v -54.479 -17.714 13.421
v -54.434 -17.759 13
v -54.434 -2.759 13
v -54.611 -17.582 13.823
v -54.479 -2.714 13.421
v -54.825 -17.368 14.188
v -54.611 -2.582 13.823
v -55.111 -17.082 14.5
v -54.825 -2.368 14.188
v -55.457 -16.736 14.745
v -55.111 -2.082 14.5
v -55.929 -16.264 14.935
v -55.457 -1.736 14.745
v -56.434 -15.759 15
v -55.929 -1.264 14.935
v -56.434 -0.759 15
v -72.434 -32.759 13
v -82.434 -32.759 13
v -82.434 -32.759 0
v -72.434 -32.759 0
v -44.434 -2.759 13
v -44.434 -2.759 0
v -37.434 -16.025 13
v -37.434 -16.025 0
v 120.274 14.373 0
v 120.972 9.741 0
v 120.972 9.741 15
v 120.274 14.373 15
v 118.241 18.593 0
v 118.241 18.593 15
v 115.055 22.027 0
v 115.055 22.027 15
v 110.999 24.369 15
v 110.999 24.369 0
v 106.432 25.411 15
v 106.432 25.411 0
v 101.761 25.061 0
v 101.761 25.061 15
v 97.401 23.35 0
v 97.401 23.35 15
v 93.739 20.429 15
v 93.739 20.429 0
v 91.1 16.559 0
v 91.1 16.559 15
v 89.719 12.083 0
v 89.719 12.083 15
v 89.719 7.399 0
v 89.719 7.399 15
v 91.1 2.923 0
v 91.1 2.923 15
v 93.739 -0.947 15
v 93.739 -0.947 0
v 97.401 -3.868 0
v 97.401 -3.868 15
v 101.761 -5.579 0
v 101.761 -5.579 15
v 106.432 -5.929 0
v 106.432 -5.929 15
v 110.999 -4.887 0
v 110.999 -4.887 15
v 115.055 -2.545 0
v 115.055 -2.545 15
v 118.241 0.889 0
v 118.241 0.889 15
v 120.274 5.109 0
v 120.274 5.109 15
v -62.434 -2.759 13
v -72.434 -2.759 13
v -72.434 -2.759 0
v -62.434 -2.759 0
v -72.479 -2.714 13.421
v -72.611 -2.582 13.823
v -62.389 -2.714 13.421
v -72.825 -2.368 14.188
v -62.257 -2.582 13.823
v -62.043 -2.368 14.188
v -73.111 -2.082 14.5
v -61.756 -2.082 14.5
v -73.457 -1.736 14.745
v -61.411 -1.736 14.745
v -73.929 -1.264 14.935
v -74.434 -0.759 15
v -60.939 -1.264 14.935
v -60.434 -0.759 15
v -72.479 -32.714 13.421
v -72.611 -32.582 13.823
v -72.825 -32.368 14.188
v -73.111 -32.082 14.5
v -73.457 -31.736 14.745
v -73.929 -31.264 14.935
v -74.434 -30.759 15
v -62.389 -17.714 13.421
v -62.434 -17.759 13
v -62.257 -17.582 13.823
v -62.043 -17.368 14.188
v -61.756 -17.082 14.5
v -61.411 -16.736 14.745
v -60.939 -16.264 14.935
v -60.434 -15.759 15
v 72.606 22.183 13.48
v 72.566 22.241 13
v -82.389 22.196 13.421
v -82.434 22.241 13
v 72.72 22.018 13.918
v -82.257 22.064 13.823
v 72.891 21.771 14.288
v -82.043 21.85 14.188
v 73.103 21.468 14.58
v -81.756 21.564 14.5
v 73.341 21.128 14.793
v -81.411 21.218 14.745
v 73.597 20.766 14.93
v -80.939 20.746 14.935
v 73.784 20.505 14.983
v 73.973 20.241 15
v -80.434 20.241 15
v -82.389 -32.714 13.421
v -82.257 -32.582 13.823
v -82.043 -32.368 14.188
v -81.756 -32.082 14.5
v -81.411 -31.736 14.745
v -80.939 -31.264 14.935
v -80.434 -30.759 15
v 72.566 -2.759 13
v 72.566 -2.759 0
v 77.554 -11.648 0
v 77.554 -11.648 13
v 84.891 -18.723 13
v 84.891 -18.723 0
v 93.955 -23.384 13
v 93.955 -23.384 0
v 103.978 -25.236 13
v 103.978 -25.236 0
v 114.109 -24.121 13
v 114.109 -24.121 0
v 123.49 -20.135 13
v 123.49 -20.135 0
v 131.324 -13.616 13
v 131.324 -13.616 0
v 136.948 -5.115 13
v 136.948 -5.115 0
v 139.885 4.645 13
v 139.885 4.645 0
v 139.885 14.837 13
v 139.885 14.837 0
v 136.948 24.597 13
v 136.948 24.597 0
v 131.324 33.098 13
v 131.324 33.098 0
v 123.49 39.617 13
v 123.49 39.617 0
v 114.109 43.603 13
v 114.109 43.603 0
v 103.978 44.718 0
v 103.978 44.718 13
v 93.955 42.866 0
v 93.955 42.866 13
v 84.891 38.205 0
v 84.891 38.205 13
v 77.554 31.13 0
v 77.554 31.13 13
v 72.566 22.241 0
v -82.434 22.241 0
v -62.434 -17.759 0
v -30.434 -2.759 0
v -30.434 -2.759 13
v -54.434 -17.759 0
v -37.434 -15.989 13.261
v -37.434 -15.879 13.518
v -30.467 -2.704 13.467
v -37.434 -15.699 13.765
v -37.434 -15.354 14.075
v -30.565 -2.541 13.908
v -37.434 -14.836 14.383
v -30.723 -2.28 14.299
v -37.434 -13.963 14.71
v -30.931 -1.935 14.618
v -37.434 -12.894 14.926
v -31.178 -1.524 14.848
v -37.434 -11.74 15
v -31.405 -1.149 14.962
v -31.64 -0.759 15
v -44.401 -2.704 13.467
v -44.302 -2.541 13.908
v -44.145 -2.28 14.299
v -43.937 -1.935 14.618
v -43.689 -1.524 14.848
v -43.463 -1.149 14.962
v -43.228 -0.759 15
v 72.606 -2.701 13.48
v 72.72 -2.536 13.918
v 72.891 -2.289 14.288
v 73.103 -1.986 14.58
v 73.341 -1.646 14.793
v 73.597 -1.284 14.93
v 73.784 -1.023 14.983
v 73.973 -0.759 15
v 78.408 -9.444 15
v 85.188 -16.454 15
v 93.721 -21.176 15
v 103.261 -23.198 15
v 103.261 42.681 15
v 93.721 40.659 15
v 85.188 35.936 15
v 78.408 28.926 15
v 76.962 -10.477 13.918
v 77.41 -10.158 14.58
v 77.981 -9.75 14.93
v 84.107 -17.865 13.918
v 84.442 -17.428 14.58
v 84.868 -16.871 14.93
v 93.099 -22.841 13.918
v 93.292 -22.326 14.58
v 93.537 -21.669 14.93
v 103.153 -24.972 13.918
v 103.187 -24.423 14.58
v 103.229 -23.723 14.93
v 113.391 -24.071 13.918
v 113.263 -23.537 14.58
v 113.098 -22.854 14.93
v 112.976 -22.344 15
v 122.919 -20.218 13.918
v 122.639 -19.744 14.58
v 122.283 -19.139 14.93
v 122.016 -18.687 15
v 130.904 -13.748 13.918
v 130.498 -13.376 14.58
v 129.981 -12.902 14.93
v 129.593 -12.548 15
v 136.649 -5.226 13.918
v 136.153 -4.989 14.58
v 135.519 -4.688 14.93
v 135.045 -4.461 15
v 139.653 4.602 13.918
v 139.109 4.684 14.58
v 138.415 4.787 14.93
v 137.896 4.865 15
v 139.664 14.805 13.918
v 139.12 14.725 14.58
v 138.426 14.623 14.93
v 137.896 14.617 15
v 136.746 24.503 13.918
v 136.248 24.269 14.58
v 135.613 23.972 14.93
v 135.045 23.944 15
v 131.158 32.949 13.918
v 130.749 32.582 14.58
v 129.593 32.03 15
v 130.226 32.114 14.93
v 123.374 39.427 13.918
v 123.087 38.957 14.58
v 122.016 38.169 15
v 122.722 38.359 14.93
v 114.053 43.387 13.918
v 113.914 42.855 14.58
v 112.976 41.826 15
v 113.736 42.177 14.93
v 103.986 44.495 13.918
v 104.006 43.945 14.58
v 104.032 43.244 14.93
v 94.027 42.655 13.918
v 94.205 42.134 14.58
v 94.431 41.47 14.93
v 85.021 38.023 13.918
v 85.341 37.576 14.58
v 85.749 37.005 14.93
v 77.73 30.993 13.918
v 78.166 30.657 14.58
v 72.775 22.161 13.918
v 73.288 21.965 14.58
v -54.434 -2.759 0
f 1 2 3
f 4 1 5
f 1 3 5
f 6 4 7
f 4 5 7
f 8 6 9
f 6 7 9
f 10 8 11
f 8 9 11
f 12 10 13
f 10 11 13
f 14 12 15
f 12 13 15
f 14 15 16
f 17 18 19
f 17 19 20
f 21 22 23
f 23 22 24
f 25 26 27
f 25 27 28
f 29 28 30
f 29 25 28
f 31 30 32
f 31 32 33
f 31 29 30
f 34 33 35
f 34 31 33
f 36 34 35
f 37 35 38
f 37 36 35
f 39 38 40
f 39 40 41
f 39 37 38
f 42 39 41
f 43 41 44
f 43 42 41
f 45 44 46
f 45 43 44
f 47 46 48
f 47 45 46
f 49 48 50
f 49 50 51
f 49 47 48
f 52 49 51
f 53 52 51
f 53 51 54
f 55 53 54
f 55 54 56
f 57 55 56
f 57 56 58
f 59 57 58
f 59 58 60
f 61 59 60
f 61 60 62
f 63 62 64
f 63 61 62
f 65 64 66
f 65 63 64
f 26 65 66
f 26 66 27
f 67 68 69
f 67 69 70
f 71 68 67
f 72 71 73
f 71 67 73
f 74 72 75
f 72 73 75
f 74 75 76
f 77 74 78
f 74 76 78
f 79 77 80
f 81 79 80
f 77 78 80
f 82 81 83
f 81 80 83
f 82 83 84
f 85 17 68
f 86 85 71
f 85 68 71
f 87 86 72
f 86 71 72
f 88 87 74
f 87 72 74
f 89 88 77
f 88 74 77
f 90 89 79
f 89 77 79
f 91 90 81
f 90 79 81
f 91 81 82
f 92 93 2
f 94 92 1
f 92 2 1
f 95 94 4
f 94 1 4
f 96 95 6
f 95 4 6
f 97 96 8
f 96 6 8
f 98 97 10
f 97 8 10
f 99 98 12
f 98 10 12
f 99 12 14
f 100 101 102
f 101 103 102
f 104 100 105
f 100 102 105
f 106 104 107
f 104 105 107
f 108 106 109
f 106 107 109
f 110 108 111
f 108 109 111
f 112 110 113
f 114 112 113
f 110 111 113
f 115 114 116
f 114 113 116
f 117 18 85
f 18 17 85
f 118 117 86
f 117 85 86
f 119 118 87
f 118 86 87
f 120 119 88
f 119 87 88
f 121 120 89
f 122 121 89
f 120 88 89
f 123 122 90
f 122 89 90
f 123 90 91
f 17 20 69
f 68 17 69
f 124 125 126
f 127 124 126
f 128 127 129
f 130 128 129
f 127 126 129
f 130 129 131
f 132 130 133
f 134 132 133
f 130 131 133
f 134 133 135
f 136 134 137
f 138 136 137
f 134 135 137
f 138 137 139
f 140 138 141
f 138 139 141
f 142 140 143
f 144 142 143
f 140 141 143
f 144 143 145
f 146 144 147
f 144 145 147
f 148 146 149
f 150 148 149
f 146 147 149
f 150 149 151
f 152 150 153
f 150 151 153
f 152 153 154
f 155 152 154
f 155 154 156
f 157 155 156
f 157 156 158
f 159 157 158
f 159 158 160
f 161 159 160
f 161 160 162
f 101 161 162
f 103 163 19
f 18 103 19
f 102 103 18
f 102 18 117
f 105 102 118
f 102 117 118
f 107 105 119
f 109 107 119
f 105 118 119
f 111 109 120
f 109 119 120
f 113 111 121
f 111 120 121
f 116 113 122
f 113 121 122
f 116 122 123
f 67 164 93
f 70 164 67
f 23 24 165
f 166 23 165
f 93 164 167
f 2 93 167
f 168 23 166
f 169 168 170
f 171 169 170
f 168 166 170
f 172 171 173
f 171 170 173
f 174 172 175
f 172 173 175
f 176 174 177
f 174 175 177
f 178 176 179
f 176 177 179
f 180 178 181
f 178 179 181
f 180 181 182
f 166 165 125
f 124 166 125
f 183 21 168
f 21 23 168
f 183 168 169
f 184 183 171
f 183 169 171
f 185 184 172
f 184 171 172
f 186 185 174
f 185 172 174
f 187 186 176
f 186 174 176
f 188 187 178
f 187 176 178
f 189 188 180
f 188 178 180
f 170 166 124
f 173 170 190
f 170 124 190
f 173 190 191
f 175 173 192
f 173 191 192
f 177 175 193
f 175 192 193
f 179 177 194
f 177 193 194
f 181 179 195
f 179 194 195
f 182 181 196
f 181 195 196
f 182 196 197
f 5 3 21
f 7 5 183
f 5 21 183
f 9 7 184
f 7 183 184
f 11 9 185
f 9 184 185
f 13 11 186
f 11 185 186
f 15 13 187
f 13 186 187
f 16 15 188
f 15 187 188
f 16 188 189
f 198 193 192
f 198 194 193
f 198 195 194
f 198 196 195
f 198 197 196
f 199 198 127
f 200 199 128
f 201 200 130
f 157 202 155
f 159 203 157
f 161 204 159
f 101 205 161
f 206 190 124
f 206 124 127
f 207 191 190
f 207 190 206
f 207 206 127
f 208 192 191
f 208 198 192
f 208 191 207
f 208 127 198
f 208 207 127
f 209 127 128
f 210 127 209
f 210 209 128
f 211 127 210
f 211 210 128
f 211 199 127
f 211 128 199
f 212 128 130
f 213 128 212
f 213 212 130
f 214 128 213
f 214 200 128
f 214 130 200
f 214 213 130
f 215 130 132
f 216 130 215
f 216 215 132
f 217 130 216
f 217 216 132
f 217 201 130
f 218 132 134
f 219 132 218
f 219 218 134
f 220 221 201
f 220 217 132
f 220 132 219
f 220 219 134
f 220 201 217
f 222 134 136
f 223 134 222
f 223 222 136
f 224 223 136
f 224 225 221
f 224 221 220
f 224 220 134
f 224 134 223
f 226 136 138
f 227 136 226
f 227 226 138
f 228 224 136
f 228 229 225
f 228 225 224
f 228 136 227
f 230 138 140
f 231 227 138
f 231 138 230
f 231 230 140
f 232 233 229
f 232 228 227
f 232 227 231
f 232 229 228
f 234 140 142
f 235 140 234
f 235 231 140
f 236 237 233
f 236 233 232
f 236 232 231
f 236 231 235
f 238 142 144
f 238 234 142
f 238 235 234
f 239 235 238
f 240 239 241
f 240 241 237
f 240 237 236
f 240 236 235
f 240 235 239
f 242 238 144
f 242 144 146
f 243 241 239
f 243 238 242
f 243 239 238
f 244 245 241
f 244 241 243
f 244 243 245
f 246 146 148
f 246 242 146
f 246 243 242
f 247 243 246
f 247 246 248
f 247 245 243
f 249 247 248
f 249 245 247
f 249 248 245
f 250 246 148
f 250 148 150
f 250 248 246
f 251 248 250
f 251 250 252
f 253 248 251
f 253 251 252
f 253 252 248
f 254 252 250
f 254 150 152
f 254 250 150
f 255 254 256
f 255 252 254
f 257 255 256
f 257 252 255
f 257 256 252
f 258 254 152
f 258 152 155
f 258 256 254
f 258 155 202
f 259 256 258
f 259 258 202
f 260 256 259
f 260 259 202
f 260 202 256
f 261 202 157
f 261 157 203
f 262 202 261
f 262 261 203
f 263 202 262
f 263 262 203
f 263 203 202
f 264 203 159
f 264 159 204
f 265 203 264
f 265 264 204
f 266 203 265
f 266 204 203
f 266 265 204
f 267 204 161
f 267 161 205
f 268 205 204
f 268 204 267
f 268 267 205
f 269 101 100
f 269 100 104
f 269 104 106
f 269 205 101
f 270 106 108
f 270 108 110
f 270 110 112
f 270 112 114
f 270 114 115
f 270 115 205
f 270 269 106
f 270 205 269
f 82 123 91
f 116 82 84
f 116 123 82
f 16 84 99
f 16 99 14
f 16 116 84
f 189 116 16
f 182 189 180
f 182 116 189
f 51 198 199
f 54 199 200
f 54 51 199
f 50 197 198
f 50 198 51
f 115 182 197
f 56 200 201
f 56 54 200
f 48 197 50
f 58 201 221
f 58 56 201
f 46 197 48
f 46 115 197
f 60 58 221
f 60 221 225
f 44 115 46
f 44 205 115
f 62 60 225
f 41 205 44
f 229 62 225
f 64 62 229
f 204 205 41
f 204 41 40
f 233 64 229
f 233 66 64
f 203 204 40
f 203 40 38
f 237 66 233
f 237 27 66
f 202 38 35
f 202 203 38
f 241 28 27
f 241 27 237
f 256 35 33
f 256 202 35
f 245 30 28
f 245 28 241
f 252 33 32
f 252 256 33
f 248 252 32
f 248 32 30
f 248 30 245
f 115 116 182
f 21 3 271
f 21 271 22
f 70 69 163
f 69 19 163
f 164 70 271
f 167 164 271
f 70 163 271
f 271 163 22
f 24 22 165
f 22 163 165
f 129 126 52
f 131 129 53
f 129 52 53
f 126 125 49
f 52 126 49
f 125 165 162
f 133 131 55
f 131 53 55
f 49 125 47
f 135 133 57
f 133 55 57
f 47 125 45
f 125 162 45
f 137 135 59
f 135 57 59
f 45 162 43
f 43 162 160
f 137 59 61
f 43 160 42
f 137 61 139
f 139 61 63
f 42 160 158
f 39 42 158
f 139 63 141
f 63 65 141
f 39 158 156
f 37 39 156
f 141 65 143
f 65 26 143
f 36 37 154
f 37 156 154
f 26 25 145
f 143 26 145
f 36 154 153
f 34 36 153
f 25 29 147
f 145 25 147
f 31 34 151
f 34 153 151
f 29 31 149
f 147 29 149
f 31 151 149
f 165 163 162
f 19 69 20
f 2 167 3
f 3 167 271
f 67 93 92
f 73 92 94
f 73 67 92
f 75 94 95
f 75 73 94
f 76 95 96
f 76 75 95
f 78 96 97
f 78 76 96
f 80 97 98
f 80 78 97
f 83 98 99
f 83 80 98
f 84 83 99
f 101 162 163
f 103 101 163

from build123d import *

# Parameters (mm, degrees)
F0_W     = 10
F0_H     = 30
F0_W_2   = 8
F0_H_2   = 15
F0_R     = 15.7140180489
F1_DEPTH = 15
F2_R     = 2


with BuildPart() as f1:
    # F0 (on Top) → F1 (new body)
    with BuildSketch(Plane.XY):
        Polygon((72.5661343038, 22.2410344053), (-82.4338656962, 22.2410344053), (-82.4338656962, -2.7589655947), (-72.4338656962, -2.7589655947), (-62.4338656962, -2.7589655947), (-54.4338656962, -2.7589655947), (-44.4338656962, -2.7589655947), (-30.4338656962, -2.7589655947), (72.5661343038, -2.7589655947), align=None)
        with Locations((-77.4338656962, -17.7589655947)):
            Rectangle(F0_W, F0_H)
        with Locations((-58.4338656962, -10.2589655947)):
            Rectangle(F0_W_2, F0_H_2)
        Polygon((-37.4338656962, -16.0254647561), (-30.4338656962, -2.7589655947), (-44.4338656962, -2.7589655947), align=None)
        with BuildLine():
            ThreePointArc((72.5661343038, -2.7589655947), (140.2578763804, 9.7410344053), (72.5661343038, 22.2410344053))
            Line((72.5661343038, 22.2410344053), (72.5661343038, -2.7589655947))
        make_face()
        with Locations((105.2578763804, 9.7410344053)):
            Circle(F0_R, mode=Mode.SUBTRACT)
    extrude(amount=F1_DEPTH)

    # F2
    f2_edges = [f1.edges().sort_by_distance(p)[0] for p in [
        (-82.433866, -5.258966, 15),
        (-4.933866, 22.241034, 15),
        (-72.433866, -17.758966, 15),
        (-77.433866, -32.758966, 15),
        (-67.433866, -2.758966, 15),
        (-62.433866, -10.258966, 15),
        (-58.433866, -17.758966, 15),
        (-54.433866, -10.258966, 15),
        (-40.933866, -9.392215, 15),
        (21.066134, -2.758966, 15),
        (-33.933866, -9.392215, 15),
        (140.257876, 9.741034, 15),
        (-49.433866, -2.758966, 15),
    ]]
    fillet(f2_edges, radius=F2_R)


solid = f1.part
